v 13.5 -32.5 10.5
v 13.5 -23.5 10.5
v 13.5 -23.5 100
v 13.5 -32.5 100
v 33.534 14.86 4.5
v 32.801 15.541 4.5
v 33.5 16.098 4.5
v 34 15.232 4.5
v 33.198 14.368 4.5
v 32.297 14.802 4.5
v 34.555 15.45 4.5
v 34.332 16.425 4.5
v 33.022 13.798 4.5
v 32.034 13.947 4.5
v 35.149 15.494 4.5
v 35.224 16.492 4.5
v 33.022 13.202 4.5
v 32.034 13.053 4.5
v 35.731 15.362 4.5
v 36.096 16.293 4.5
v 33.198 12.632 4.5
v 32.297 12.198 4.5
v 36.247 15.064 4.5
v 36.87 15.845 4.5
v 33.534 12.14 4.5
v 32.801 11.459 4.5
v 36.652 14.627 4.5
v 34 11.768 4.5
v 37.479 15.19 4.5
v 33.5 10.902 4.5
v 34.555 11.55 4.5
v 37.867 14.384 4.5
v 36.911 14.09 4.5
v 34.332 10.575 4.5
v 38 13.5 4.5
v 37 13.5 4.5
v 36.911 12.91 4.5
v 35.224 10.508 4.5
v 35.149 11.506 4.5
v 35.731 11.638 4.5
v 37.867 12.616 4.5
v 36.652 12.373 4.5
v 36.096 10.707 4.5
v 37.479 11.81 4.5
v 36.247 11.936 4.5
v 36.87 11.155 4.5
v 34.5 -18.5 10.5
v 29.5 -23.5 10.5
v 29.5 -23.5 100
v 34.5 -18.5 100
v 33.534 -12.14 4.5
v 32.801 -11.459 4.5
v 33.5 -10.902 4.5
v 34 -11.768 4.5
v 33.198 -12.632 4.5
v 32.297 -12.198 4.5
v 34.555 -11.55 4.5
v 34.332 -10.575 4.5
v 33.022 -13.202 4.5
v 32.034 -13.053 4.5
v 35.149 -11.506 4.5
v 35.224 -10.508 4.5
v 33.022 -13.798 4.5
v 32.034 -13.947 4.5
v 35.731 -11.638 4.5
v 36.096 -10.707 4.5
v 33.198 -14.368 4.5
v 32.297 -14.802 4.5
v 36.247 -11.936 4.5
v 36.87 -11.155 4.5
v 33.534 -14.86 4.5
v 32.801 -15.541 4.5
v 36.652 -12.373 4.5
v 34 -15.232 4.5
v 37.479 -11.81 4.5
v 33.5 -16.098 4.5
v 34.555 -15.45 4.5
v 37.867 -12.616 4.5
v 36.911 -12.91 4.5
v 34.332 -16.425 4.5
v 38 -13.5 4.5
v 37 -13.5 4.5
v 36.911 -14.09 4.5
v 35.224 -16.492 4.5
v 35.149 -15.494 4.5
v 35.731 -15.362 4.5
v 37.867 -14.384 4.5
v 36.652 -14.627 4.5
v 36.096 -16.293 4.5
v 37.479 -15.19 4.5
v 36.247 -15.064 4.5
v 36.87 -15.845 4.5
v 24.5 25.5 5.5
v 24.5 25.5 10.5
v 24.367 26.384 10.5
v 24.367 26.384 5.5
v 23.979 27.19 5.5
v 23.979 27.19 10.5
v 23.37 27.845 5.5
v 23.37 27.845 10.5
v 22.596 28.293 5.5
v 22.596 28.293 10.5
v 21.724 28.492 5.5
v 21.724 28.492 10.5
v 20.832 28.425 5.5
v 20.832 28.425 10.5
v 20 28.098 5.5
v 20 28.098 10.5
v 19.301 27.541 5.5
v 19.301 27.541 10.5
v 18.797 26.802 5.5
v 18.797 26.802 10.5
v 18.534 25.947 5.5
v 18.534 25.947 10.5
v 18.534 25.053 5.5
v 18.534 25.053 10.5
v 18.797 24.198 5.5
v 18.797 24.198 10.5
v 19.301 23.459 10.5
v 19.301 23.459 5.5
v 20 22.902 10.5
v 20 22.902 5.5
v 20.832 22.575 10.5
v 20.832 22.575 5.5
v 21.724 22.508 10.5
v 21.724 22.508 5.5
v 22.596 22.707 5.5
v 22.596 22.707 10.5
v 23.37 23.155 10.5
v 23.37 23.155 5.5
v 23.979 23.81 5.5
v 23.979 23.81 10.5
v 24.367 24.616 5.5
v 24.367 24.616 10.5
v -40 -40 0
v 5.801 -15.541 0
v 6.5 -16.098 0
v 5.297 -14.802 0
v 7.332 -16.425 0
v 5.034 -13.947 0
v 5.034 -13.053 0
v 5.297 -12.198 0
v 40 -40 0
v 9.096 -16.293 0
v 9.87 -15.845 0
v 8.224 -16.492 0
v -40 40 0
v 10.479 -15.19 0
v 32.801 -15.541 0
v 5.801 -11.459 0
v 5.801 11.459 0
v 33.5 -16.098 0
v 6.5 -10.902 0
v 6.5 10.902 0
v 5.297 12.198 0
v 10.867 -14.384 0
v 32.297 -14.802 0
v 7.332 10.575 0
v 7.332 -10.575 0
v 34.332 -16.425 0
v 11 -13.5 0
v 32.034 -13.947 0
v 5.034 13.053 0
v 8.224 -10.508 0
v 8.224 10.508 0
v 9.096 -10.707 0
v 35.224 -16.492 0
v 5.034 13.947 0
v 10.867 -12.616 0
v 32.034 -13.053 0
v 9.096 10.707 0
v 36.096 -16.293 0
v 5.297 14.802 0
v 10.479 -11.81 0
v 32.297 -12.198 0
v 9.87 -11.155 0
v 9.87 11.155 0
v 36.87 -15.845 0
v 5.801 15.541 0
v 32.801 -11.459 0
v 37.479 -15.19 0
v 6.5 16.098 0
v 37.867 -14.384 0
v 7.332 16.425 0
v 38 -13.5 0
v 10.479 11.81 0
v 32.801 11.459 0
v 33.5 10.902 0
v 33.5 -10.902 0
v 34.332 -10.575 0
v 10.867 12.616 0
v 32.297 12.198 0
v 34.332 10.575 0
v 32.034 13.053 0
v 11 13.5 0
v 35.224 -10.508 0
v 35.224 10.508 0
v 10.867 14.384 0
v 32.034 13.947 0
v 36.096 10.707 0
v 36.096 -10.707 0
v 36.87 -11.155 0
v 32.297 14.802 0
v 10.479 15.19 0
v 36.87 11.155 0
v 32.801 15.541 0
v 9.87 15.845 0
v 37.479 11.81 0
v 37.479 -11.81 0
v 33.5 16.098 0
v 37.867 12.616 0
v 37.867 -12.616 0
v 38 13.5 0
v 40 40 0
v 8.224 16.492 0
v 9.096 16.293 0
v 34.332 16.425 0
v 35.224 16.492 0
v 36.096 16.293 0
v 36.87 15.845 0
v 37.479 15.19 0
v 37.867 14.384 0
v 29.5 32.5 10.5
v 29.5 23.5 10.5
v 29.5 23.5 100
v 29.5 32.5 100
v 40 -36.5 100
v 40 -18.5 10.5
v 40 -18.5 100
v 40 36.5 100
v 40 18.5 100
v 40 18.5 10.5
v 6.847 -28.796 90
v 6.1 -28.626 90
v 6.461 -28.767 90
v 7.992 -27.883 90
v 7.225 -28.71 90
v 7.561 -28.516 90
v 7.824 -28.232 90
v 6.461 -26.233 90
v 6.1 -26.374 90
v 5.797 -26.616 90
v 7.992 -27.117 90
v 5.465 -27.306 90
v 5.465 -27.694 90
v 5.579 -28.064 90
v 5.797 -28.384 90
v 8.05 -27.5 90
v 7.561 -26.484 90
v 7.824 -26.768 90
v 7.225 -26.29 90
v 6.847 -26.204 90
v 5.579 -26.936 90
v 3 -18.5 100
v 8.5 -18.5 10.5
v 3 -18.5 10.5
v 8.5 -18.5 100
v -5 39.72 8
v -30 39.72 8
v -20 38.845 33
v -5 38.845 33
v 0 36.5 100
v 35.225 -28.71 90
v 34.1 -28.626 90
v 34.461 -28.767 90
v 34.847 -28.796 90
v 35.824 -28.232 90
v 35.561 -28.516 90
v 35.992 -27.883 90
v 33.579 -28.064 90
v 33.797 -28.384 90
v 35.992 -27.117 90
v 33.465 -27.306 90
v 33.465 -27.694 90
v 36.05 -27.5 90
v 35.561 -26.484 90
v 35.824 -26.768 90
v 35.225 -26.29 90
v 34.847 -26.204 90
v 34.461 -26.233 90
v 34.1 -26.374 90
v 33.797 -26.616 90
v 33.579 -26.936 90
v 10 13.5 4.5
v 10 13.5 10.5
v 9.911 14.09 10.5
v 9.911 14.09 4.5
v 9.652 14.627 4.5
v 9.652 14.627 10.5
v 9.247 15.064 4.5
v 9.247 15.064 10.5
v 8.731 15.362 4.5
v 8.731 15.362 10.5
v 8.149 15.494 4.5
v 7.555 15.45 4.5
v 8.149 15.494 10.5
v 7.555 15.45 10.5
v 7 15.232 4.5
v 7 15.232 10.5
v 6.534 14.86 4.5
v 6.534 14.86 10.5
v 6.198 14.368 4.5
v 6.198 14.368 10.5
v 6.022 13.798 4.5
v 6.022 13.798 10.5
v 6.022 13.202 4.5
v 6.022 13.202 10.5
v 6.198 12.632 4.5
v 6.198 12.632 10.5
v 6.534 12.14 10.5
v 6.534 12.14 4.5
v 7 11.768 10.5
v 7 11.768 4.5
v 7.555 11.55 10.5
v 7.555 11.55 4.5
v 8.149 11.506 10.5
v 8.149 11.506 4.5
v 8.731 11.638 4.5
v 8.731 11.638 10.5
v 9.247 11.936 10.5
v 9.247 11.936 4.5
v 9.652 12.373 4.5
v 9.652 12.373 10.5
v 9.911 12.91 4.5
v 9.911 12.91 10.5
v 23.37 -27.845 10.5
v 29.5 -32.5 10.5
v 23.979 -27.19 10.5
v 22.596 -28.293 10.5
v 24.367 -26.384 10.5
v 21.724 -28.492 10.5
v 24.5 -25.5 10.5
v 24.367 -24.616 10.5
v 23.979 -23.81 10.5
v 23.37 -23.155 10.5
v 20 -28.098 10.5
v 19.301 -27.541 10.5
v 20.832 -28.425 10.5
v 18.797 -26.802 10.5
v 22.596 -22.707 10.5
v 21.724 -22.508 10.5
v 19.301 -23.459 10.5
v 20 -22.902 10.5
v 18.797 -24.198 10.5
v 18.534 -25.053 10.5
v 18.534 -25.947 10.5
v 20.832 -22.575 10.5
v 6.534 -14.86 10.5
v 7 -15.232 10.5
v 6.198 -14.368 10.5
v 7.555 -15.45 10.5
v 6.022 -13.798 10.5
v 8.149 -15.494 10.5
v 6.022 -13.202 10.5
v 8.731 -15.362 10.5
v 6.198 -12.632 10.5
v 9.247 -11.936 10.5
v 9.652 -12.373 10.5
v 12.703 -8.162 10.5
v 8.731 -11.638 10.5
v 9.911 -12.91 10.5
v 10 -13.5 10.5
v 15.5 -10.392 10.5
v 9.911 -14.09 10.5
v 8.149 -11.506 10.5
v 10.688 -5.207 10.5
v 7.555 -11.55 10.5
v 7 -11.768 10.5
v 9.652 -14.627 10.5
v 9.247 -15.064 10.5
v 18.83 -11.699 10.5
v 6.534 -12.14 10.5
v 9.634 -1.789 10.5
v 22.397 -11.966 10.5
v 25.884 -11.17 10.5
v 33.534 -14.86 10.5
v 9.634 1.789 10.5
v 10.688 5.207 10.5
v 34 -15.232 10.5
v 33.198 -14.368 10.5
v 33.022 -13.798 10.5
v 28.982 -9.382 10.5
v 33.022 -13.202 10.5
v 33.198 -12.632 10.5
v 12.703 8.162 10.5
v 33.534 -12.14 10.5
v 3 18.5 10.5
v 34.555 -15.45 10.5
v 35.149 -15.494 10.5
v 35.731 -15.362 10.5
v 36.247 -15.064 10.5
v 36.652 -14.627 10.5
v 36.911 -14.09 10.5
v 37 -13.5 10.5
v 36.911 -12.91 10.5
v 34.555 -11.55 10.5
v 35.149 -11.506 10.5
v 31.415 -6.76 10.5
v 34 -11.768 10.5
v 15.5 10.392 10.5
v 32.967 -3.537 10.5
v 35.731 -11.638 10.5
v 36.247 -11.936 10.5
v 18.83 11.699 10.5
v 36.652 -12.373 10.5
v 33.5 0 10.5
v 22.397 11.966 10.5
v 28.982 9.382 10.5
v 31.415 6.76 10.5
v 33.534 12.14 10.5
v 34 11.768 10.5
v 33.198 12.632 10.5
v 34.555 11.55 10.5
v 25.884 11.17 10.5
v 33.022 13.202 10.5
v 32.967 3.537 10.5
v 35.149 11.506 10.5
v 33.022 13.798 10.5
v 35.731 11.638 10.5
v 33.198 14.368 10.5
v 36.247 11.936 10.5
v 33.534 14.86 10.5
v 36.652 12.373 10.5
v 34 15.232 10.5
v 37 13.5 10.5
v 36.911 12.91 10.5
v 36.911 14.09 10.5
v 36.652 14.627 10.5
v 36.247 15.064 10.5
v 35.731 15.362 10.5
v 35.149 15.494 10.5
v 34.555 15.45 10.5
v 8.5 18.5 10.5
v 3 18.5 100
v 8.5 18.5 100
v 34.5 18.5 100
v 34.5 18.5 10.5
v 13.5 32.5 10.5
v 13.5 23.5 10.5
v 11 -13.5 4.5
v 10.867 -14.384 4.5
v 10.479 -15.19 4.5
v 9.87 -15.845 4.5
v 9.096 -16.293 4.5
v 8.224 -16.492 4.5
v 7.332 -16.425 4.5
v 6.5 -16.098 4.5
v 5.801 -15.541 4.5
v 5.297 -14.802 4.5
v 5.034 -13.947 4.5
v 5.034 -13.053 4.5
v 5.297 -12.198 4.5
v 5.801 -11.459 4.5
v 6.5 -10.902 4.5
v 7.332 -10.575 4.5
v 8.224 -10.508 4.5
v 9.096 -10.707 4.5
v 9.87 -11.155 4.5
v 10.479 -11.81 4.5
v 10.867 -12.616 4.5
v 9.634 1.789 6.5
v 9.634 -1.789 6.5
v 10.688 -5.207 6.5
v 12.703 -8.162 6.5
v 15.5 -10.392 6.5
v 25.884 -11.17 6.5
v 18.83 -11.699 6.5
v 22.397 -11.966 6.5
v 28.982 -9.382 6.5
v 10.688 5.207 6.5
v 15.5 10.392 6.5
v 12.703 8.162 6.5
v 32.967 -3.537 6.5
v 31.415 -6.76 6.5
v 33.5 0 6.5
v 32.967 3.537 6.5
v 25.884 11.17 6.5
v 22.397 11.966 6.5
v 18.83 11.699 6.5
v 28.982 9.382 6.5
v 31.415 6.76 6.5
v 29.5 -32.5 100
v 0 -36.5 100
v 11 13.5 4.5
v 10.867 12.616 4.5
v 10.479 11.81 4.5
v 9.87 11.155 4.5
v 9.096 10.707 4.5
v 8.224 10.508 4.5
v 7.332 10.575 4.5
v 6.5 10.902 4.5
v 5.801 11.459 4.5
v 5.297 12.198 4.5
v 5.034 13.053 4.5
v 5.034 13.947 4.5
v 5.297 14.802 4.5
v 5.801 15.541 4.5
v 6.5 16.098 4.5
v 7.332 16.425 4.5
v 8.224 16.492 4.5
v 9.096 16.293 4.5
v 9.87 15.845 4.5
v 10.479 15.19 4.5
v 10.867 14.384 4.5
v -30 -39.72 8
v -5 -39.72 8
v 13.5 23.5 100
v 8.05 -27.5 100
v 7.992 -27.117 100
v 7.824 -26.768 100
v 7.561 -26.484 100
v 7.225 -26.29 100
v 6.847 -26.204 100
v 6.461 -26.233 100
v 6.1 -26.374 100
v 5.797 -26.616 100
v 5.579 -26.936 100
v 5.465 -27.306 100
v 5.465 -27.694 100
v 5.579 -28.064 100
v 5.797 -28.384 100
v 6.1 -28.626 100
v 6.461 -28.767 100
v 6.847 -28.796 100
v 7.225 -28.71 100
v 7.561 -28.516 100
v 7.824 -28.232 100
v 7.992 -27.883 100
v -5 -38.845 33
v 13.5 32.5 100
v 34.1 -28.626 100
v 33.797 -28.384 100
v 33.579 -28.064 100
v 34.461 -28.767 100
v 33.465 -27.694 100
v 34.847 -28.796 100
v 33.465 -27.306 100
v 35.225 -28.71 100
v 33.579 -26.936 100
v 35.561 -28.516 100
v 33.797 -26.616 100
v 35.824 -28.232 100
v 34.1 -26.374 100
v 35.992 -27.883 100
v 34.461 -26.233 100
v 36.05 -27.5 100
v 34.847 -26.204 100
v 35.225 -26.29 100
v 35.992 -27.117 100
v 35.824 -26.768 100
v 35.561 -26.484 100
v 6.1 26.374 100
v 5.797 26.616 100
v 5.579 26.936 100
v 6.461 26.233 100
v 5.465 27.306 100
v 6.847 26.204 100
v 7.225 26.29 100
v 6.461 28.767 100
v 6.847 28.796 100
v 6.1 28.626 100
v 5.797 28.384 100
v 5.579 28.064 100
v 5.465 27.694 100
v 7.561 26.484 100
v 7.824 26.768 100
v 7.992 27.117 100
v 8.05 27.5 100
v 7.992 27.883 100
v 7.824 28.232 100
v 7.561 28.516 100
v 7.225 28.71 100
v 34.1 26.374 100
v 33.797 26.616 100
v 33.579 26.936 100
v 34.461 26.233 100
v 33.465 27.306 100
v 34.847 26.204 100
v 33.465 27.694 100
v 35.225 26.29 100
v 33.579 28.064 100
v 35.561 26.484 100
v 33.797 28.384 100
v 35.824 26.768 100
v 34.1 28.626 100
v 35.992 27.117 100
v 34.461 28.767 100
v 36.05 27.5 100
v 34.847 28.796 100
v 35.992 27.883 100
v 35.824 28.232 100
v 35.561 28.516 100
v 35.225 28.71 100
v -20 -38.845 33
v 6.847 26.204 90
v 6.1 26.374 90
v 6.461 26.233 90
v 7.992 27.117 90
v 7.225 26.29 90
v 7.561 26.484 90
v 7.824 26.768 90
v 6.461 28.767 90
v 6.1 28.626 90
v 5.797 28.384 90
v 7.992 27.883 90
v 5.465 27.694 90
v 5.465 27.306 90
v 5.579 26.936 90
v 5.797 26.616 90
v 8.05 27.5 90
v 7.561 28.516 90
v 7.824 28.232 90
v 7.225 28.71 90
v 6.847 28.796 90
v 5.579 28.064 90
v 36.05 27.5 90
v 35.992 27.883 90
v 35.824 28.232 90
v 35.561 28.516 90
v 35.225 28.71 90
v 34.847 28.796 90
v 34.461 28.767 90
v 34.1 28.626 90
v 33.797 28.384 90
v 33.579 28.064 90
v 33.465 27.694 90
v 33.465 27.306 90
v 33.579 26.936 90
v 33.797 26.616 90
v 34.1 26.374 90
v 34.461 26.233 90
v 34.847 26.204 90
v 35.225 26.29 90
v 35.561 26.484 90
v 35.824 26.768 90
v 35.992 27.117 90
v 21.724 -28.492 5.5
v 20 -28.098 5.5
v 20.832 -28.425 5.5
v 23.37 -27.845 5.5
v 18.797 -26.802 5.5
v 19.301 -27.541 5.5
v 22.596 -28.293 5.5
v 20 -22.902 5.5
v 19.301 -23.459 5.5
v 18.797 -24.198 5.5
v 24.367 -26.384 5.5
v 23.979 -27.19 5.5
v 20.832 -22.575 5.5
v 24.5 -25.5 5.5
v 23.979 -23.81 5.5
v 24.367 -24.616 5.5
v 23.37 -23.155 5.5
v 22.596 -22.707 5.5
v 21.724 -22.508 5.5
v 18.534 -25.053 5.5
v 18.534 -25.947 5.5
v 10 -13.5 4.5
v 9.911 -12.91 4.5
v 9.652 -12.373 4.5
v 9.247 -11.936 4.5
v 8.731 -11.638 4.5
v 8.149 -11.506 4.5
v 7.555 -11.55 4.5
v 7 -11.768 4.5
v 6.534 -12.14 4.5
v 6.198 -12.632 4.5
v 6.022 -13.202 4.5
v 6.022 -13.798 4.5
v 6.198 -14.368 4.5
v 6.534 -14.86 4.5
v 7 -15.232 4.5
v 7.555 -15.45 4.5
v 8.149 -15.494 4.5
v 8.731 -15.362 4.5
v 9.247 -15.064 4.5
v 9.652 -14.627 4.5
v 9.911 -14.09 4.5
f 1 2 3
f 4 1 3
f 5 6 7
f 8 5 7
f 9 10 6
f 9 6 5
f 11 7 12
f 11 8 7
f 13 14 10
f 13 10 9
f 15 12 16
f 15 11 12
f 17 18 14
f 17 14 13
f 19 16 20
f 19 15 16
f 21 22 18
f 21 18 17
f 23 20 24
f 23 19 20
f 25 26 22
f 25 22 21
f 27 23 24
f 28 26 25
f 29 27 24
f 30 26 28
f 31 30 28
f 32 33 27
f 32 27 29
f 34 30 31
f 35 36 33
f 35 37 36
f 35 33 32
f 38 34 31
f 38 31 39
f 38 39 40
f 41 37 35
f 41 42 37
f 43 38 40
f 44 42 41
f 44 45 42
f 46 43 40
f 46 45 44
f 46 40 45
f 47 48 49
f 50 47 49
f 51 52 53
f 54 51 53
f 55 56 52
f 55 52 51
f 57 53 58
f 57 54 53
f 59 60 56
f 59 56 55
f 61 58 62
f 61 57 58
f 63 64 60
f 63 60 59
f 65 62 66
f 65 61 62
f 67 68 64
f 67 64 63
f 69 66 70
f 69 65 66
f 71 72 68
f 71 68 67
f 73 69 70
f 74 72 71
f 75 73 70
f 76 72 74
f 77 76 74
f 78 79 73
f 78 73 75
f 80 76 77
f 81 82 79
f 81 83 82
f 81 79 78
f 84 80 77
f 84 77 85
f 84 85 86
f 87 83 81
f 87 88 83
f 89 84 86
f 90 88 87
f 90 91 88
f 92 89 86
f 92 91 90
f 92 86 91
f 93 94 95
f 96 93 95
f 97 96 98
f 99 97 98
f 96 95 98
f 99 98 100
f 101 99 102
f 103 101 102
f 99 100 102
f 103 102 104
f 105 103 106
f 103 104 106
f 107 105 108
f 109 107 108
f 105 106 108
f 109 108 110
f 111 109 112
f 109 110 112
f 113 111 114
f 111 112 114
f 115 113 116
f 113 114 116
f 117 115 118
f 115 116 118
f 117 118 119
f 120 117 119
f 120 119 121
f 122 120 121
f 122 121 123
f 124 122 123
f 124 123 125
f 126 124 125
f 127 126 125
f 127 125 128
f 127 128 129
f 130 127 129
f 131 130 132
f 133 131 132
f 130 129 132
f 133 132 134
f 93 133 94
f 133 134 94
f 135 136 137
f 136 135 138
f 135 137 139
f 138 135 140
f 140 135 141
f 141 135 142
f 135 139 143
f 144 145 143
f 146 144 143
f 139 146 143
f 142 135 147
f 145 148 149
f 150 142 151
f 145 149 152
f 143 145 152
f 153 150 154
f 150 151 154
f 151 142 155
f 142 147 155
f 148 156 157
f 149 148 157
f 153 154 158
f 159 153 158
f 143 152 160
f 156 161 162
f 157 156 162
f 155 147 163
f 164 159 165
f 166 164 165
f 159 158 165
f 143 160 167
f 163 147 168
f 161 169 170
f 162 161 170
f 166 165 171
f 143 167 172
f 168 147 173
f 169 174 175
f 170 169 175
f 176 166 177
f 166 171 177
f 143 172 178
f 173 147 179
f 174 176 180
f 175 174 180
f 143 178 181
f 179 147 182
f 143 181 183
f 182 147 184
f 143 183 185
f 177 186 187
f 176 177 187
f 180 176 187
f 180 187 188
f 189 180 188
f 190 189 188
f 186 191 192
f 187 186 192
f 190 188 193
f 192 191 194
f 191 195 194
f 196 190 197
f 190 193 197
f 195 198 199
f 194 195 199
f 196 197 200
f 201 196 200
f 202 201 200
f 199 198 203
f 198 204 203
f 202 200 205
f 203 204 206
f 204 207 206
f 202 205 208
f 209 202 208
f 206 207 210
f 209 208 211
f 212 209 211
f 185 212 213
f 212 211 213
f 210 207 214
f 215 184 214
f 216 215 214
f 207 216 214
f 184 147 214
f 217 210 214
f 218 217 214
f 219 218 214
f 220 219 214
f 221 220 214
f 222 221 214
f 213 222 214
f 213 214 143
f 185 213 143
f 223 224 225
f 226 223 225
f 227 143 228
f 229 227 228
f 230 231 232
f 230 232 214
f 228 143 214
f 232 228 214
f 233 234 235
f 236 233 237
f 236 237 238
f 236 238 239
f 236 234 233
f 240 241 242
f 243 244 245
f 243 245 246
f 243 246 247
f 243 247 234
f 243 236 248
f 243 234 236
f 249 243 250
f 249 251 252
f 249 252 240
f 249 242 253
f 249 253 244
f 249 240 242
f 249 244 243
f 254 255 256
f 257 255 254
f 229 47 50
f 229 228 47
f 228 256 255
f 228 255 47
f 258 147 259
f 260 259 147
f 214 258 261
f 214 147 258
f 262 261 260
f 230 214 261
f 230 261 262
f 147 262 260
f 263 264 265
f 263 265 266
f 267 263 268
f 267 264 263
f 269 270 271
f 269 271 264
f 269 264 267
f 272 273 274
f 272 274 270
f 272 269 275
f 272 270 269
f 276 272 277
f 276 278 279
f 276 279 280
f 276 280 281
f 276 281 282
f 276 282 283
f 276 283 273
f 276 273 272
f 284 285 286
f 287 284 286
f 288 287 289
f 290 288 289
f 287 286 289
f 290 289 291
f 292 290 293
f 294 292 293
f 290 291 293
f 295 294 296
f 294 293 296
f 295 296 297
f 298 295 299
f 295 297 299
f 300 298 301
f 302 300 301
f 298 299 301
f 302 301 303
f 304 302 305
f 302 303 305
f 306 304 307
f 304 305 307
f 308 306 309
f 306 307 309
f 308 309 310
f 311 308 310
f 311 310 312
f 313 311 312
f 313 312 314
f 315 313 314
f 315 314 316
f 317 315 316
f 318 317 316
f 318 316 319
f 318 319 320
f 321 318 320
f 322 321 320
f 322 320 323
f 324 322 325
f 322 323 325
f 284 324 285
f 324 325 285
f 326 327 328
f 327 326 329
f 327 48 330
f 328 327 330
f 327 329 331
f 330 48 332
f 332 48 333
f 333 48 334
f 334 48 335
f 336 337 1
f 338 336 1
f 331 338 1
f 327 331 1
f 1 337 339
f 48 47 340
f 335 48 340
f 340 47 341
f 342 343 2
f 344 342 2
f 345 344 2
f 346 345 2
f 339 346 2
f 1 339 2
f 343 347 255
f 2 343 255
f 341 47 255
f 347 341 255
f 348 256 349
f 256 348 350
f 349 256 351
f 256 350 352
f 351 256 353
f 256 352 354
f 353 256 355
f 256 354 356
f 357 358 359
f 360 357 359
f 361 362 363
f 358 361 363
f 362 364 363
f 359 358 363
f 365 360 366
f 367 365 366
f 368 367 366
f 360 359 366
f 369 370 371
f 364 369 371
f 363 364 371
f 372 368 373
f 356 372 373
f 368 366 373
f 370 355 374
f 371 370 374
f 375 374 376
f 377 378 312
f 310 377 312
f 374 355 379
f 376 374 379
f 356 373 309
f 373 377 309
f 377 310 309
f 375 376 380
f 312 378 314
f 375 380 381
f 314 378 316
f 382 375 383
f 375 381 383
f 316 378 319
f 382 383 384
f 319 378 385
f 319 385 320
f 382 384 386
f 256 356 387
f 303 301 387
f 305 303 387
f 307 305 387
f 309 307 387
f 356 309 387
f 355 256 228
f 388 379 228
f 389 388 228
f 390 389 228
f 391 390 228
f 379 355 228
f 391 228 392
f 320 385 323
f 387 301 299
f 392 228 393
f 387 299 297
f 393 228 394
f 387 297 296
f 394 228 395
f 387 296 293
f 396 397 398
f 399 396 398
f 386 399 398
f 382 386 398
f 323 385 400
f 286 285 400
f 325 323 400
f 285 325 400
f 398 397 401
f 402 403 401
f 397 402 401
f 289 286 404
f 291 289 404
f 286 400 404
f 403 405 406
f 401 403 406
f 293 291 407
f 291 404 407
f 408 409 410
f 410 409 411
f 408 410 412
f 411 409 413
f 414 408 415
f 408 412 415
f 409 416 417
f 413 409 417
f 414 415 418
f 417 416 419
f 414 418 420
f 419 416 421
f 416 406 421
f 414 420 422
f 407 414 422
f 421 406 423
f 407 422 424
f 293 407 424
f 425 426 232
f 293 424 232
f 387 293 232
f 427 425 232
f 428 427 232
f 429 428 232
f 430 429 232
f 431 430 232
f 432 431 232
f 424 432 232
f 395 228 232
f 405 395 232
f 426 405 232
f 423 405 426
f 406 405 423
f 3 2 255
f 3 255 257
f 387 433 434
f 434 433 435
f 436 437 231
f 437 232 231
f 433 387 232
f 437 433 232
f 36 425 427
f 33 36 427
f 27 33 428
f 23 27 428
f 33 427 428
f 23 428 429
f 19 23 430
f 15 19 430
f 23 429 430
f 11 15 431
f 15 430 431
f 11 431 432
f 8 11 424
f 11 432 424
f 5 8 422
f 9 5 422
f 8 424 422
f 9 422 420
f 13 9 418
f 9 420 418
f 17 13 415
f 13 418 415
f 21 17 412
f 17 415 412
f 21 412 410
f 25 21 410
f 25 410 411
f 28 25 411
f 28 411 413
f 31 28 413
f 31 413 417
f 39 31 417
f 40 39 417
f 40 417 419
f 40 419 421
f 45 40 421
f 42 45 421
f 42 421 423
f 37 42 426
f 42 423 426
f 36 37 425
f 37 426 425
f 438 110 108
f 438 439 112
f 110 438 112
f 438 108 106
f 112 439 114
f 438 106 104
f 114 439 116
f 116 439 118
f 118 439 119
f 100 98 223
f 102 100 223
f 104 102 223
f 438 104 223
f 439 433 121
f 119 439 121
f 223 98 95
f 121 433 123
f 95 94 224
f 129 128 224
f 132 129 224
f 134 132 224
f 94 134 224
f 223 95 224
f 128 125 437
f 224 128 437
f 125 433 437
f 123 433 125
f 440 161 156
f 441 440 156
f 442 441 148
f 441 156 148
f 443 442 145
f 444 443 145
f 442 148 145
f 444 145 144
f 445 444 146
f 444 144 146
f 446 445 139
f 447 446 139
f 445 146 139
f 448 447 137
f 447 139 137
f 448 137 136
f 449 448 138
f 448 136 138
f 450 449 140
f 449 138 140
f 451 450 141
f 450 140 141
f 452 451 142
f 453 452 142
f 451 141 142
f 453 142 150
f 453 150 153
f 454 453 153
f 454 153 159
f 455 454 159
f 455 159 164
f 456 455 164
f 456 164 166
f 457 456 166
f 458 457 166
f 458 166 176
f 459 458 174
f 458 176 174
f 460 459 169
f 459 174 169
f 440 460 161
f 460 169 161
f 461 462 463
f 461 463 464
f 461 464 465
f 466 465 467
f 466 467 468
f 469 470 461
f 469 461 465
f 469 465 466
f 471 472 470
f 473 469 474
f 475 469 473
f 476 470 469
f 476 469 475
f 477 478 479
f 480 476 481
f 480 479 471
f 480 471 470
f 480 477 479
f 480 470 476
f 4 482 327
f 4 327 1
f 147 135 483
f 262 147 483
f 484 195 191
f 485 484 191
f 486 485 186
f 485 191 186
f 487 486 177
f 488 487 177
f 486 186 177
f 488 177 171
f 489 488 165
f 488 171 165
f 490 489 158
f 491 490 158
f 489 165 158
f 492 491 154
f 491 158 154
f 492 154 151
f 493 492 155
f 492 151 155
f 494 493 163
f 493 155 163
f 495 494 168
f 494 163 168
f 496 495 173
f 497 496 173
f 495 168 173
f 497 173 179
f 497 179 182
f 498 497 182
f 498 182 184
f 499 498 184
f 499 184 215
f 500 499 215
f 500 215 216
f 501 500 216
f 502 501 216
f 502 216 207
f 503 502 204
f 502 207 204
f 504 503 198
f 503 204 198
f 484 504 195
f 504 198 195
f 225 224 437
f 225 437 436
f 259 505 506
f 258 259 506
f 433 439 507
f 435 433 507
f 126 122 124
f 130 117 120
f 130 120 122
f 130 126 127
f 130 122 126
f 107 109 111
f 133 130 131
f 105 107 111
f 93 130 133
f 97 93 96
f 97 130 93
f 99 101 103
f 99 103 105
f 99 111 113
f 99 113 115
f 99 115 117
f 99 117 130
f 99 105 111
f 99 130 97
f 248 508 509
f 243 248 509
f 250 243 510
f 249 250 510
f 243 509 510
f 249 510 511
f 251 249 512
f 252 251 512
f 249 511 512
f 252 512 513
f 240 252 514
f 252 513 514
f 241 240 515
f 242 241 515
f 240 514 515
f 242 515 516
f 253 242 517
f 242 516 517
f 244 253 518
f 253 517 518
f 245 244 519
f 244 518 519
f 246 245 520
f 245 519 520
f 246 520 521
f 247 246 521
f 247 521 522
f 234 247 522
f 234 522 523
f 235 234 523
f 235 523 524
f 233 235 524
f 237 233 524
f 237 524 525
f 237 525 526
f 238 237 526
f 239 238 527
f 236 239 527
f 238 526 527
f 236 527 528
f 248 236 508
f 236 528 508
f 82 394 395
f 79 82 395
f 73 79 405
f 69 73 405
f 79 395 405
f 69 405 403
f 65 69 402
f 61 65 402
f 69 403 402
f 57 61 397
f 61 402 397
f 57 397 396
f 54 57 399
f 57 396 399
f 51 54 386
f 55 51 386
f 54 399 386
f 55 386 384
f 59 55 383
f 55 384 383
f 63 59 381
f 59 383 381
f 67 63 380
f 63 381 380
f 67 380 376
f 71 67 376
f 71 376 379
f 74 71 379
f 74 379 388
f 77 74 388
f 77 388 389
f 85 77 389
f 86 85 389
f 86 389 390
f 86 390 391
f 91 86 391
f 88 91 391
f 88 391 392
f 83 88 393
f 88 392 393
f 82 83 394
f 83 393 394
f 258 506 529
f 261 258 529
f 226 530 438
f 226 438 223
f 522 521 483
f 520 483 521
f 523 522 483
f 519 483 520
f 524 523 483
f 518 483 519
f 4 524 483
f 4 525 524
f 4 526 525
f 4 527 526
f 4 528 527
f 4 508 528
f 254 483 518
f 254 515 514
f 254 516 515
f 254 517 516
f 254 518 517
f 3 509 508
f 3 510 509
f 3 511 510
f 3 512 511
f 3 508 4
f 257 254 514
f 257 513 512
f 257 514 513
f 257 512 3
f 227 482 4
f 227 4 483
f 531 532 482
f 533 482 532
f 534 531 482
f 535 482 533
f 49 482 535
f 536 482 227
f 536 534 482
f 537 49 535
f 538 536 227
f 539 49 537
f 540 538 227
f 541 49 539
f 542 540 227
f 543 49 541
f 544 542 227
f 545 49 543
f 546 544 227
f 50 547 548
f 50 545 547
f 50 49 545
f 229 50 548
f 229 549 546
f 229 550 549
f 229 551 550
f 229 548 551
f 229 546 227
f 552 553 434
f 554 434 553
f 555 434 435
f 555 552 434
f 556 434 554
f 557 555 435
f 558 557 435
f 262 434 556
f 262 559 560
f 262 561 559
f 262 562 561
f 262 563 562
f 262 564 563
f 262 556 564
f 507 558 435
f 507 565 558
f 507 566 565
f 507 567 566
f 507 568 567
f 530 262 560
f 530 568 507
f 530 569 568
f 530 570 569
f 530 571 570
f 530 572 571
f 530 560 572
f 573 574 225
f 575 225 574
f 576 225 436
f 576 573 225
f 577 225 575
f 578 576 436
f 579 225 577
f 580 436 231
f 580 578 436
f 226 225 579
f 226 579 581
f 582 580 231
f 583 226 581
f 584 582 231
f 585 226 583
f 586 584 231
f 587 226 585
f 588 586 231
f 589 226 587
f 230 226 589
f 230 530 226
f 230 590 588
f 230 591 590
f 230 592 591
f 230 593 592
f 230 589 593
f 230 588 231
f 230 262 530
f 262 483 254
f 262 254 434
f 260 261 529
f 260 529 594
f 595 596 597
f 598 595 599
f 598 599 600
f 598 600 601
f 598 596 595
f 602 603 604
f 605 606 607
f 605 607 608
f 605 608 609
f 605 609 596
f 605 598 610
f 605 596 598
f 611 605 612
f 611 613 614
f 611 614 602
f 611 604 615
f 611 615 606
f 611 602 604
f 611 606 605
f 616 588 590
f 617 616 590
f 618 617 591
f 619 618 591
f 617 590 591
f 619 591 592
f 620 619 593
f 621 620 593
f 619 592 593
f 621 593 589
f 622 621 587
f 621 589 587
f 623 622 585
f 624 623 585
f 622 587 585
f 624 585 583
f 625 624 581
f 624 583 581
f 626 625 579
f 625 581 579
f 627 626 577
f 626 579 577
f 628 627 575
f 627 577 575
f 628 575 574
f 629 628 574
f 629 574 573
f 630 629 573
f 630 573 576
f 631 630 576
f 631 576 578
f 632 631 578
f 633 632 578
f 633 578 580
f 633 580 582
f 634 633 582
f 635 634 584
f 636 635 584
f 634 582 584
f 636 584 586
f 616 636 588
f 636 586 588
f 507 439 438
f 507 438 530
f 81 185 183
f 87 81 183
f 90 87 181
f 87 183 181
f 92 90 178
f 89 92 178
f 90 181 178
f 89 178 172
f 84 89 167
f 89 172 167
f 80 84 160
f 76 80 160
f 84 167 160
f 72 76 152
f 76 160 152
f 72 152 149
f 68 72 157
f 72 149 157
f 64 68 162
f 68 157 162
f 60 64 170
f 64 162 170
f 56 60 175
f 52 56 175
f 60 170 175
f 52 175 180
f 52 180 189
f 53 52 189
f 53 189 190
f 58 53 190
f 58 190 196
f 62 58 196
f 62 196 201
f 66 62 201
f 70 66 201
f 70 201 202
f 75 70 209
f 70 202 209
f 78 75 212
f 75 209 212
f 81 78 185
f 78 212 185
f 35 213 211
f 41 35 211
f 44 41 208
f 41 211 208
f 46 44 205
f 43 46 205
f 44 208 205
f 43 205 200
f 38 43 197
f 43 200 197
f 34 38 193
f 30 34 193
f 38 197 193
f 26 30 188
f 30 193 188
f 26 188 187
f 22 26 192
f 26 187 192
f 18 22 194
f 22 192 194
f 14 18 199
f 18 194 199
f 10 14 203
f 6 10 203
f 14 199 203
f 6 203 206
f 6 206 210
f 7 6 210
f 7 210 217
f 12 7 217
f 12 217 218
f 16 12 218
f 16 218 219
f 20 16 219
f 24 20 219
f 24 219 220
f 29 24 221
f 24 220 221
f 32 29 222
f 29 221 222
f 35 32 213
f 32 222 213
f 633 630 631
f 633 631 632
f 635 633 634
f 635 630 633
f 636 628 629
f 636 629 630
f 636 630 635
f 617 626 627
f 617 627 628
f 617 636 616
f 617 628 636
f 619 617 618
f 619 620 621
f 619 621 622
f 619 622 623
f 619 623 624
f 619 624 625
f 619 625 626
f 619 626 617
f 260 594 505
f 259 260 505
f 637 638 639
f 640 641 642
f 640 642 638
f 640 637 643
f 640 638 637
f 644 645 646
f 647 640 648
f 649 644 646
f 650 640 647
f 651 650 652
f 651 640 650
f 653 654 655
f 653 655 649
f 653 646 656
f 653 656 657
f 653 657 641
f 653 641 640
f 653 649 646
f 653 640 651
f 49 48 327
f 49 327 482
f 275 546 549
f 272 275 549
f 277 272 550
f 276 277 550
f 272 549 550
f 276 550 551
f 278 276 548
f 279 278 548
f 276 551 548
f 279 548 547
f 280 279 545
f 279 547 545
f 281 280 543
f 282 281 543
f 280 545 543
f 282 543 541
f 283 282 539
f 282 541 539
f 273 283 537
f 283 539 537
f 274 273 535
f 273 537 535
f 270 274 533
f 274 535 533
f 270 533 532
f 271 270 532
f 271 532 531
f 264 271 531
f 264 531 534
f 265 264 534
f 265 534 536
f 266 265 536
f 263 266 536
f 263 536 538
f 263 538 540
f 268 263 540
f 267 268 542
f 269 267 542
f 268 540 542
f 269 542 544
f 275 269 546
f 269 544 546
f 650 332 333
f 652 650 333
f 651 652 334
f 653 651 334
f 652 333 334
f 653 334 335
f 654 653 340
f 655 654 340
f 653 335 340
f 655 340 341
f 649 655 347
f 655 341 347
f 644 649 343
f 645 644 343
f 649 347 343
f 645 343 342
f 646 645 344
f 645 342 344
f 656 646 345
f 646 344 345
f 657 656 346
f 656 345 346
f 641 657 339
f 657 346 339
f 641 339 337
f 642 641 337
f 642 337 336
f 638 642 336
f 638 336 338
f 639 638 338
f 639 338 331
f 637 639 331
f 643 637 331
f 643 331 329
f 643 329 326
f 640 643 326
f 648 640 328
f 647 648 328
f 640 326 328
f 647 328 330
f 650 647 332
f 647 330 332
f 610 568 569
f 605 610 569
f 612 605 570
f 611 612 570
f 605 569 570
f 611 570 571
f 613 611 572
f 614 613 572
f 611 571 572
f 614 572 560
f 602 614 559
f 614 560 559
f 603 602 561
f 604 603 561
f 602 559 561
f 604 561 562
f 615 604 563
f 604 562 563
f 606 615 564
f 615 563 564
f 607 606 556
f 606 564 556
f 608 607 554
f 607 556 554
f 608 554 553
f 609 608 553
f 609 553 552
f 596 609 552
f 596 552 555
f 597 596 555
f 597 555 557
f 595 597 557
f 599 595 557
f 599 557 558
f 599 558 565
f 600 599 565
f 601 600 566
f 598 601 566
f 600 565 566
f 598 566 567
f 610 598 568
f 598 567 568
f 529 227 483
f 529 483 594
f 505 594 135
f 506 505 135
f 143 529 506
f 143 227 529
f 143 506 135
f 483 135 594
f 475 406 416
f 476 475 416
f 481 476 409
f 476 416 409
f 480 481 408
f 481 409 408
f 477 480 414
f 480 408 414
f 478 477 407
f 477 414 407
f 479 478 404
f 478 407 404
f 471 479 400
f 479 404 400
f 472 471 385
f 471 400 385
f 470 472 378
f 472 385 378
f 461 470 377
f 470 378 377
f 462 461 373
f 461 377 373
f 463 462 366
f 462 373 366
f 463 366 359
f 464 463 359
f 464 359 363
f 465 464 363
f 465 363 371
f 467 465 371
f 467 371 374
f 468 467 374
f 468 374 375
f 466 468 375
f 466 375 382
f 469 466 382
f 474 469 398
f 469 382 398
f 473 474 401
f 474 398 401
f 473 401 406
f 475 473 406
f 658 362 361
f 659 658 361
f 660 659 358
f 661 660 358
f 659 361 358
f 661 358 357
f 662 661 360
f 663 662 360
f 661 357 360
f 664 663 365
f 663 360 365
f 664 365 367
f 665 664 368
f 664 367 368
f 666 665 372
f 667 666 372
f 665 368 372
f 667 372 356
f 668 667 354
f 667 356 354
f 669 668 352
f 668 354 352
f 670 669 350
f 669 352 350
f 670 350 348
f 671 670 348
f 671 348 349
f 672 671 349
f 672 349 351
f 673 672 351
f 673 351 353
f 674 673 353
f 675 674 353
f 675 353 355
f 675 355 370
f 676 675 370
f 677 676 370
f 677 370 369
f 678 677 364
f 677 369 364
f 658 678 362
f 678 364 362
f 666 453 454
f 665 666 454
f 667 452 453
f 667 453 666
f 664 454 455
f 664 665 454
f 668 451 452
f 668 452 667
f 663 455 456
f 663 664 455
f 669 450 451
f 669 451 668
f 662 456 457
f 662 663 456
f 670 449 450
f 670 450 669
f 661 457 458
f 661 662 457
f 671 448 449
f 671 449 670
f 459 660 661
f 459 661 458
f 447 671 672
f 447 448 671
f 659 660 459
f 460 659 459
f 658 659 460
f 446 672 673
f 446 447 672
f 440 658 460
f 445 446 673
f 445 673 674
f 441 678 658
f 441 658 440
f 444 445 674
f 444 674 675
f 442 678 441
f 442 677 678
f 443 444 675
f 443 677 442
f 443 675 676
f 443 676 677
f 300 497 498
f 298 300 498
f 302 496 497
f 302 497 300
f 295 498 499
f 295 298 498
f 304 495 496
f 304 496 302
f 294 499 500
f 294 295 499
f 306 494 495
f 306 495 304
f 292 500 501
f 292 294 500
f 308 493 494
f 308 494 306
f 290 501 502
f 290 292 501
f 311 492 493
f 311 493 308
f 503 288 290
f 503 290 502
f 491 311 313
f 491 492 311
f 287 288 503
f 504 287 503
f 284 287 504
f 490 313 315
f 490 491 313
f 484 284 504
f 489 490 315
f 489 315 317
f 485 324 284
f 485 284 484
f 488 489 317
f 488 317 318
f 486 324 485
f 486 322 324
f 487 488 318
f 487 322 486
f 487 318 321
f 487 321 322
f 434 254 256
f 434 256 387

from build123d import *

# Parameters (mm, degrees)
SKETCH007_W     = 80
SKETCH007_H     = 80
PAD005_DEPTH    = 100
POCKET001_DEPTH = 80.001
POCKET002_DEPTH = 80.001
SKETCH011_W     = 37
SKETCH011_H     = 1660.928571
POCKET003_DEPTH = 37
SKETCH012_R     = 12
POCKET004_DEPTH = 4
SKETCH013_R     = 2
POCKET005_DEPTH = 10.501
SKETCH014_R     = 3
POCKET006_DEPTH = 4.5
SKETCH016_W     = 16
SKETCH016_H     = 89.5
POCKET008_DEPTH = 14
SKETCH024_W     = 16
SKETCH024_H     = 89.5
POCKET015_DEPTH = 14
SKETCH018_R     = 3
POCKET010_DEPTH = 5
SKETCH022_R     = 1.3
POCKET013_DEPTH = 10
CHAMFER_SIZE    = 5


with BuildPart() as part:
    # Sketch007 → Pad005 (new body)
    with BuildSketch(Plane.XY):
        Rectangle(SKETCH007_W, SKETCH007_H)
    extrude(amount=PAD005_DEPTH)

    # Sketch008 (on Face2 of Pad005) → Pocket001 (cut, through all)
    with BuildSketch(Plane.XZ.offset(40)):
        Polygon((-40, 0), (0, 100), (-40, 100), align=None)
        Polygon((-30, 8), (-5, 8), (-5, 33), (-20, 33), align=None)
    extrude(amount=-POCKET001_DEPTH, mode=Mode.SUBTRACT)

    # Sketch009 (on Face4 of Pocket001) → Pocket002 (cut, through all)
    with BuildSketch(Plane.YZ.offset(40)):
        Polygon((-36.5, 100), (-40, 0), (-40, 100), align=None)
        Polygon((40, 0), (36.5, 100), (40, 100), align=None)
    extrude(amount=-POCKET002_DEPTH, mode=Mode.SUBTRACT)

    # Sketch011 (on Face4 of Pocket002) → Pocket003 (cut)
    with BuildSketch(Plane.YZ.offset(40)):
        with Locations((0, 840.964285)):
            Rectangle(SKETCH011_W, SKETCH011_H)
    extrude(amount=-POCKET003_DEPTH, mode=Mode.SUBTRACT)

    # Sketch012 (on Face12 of Pocket003) → Pocket004 (cut)
    with BuildSketch(Plane.XY.offset(10.5)):
        with Locations((21.5, 0)):
            Circle(SKETCH012_R)
    extrude(amount=-POCKET004_DEPTH, mode=Mode.SUBTRACT)

    # Sketch013 (on Face12 of Pocket004) → Pocket005 (cut, through all)
    with BuildSketch(Plane.XY.offset(10.5)):
        with Locations((8, 13.5)):
            Circle(SKETCH013_R)
        with Locations((35, 13.5)):
            Circle(SKETCH013_R)
        with Locations((35, -13.5)):
            Circle(SKETCH013_R)
        with Locations((8, -13.5)):
            Circle(SKETCH013_R)
    extrude(amount=-POCKET005_DEPTH, mode=Mode.SUBTRACT)

    # Sketch014 (on Face1 of Pocket005) → Pocket006 (cut)
    with BuildSketch(Plane(origin=(0, 0, 0), x_dir=(1, 0, 0), z_dir=(0, 0, -1))):
        with Locations((8, 13.5)):
            Circle(SKETCH014_R)
        with Locations((35, 13.5)):
            Circle(SKETCH014_R)
        with Locations((35, -13.5)):
            Circle(SKETCH014_R)
        with Locations((8, -13.5)):
            Circle(SKETCH014_R)
    extrude(amount=-POCKET006_DEPTH, mode=Mode.SUBTRACT)

    # Sketch016 (on Face15 of Pocket006) → Pocket008 (cut)
    with BuildSketch(Plane.XZ.offset(-18.5)):
        with Locations((21.5, 55.25)):
            Rectangle(SKETCH016_W, SKETCH016_H)
    extrude(amount=-POCKET008_DEPTH, mode=Mode.SUBTRACT)

    # Sketch024 (on Face16 of Pocket008) → Pocket015 (cut)
    with BuildSketch(Plane(origin=(0, -18.5, 0), x_dir=(-1, 0, 0), z_dir=(0, 1, 0))):
        with Locations((-21.5, 55.25)):
            Rectangle(SKETCH024_W, SKETCH024_H)
    extrude(amount=-POCKET015_DEPTH, mode=Mode.SUBTRACT)

    # Sketch018 (on Face34 of Pocket015) → Pocket010 (cut)
    with BuildSketch(Plane.XY.offset(10.5)):
        with Locations((21.5, -25.5)):
            Circle(SKETCH018_R)
        with Locations((21.5, 25.5)):
            Circle(SKETCH018_R)
    extrude(amount=-POCKET010_DEPTH, mode=Mode.SUBTRACT)

    # Sketch022 (on Face10 of Pocket010) → Pocket013 (cut)
    with BuildSketch(Plane.XY.offset(100)):
        with Locations((6.75, 27.5)):
            Circle(SKETCH022_R)
        with Locations((34.75, 27.5)):
            Circle(SKETCH022_R)
        with Locations((6.75, -27.5)):
            Circle(SKETCH022_R)
        with Locations((34.75, -27.5)):
            Circle(SKETCH022_R)
    extrude(amount=-POCKET013_DEPTH, mode=Mode.SUBTRACT)

    # Chamfer
    chamfer_edges = [part.edges().sort_by_distance(p)[0] for p in [
        (29.5, -18.5, 55.25),
        (13.5, -18.5, 55.25),
        (13.5, 18.5, 55.25),
        (29.5, 18.5, 55.25),
    ]]
    chamfer(chamfer_edges, length=CHAMFER_SIZE)


solid = part.part
